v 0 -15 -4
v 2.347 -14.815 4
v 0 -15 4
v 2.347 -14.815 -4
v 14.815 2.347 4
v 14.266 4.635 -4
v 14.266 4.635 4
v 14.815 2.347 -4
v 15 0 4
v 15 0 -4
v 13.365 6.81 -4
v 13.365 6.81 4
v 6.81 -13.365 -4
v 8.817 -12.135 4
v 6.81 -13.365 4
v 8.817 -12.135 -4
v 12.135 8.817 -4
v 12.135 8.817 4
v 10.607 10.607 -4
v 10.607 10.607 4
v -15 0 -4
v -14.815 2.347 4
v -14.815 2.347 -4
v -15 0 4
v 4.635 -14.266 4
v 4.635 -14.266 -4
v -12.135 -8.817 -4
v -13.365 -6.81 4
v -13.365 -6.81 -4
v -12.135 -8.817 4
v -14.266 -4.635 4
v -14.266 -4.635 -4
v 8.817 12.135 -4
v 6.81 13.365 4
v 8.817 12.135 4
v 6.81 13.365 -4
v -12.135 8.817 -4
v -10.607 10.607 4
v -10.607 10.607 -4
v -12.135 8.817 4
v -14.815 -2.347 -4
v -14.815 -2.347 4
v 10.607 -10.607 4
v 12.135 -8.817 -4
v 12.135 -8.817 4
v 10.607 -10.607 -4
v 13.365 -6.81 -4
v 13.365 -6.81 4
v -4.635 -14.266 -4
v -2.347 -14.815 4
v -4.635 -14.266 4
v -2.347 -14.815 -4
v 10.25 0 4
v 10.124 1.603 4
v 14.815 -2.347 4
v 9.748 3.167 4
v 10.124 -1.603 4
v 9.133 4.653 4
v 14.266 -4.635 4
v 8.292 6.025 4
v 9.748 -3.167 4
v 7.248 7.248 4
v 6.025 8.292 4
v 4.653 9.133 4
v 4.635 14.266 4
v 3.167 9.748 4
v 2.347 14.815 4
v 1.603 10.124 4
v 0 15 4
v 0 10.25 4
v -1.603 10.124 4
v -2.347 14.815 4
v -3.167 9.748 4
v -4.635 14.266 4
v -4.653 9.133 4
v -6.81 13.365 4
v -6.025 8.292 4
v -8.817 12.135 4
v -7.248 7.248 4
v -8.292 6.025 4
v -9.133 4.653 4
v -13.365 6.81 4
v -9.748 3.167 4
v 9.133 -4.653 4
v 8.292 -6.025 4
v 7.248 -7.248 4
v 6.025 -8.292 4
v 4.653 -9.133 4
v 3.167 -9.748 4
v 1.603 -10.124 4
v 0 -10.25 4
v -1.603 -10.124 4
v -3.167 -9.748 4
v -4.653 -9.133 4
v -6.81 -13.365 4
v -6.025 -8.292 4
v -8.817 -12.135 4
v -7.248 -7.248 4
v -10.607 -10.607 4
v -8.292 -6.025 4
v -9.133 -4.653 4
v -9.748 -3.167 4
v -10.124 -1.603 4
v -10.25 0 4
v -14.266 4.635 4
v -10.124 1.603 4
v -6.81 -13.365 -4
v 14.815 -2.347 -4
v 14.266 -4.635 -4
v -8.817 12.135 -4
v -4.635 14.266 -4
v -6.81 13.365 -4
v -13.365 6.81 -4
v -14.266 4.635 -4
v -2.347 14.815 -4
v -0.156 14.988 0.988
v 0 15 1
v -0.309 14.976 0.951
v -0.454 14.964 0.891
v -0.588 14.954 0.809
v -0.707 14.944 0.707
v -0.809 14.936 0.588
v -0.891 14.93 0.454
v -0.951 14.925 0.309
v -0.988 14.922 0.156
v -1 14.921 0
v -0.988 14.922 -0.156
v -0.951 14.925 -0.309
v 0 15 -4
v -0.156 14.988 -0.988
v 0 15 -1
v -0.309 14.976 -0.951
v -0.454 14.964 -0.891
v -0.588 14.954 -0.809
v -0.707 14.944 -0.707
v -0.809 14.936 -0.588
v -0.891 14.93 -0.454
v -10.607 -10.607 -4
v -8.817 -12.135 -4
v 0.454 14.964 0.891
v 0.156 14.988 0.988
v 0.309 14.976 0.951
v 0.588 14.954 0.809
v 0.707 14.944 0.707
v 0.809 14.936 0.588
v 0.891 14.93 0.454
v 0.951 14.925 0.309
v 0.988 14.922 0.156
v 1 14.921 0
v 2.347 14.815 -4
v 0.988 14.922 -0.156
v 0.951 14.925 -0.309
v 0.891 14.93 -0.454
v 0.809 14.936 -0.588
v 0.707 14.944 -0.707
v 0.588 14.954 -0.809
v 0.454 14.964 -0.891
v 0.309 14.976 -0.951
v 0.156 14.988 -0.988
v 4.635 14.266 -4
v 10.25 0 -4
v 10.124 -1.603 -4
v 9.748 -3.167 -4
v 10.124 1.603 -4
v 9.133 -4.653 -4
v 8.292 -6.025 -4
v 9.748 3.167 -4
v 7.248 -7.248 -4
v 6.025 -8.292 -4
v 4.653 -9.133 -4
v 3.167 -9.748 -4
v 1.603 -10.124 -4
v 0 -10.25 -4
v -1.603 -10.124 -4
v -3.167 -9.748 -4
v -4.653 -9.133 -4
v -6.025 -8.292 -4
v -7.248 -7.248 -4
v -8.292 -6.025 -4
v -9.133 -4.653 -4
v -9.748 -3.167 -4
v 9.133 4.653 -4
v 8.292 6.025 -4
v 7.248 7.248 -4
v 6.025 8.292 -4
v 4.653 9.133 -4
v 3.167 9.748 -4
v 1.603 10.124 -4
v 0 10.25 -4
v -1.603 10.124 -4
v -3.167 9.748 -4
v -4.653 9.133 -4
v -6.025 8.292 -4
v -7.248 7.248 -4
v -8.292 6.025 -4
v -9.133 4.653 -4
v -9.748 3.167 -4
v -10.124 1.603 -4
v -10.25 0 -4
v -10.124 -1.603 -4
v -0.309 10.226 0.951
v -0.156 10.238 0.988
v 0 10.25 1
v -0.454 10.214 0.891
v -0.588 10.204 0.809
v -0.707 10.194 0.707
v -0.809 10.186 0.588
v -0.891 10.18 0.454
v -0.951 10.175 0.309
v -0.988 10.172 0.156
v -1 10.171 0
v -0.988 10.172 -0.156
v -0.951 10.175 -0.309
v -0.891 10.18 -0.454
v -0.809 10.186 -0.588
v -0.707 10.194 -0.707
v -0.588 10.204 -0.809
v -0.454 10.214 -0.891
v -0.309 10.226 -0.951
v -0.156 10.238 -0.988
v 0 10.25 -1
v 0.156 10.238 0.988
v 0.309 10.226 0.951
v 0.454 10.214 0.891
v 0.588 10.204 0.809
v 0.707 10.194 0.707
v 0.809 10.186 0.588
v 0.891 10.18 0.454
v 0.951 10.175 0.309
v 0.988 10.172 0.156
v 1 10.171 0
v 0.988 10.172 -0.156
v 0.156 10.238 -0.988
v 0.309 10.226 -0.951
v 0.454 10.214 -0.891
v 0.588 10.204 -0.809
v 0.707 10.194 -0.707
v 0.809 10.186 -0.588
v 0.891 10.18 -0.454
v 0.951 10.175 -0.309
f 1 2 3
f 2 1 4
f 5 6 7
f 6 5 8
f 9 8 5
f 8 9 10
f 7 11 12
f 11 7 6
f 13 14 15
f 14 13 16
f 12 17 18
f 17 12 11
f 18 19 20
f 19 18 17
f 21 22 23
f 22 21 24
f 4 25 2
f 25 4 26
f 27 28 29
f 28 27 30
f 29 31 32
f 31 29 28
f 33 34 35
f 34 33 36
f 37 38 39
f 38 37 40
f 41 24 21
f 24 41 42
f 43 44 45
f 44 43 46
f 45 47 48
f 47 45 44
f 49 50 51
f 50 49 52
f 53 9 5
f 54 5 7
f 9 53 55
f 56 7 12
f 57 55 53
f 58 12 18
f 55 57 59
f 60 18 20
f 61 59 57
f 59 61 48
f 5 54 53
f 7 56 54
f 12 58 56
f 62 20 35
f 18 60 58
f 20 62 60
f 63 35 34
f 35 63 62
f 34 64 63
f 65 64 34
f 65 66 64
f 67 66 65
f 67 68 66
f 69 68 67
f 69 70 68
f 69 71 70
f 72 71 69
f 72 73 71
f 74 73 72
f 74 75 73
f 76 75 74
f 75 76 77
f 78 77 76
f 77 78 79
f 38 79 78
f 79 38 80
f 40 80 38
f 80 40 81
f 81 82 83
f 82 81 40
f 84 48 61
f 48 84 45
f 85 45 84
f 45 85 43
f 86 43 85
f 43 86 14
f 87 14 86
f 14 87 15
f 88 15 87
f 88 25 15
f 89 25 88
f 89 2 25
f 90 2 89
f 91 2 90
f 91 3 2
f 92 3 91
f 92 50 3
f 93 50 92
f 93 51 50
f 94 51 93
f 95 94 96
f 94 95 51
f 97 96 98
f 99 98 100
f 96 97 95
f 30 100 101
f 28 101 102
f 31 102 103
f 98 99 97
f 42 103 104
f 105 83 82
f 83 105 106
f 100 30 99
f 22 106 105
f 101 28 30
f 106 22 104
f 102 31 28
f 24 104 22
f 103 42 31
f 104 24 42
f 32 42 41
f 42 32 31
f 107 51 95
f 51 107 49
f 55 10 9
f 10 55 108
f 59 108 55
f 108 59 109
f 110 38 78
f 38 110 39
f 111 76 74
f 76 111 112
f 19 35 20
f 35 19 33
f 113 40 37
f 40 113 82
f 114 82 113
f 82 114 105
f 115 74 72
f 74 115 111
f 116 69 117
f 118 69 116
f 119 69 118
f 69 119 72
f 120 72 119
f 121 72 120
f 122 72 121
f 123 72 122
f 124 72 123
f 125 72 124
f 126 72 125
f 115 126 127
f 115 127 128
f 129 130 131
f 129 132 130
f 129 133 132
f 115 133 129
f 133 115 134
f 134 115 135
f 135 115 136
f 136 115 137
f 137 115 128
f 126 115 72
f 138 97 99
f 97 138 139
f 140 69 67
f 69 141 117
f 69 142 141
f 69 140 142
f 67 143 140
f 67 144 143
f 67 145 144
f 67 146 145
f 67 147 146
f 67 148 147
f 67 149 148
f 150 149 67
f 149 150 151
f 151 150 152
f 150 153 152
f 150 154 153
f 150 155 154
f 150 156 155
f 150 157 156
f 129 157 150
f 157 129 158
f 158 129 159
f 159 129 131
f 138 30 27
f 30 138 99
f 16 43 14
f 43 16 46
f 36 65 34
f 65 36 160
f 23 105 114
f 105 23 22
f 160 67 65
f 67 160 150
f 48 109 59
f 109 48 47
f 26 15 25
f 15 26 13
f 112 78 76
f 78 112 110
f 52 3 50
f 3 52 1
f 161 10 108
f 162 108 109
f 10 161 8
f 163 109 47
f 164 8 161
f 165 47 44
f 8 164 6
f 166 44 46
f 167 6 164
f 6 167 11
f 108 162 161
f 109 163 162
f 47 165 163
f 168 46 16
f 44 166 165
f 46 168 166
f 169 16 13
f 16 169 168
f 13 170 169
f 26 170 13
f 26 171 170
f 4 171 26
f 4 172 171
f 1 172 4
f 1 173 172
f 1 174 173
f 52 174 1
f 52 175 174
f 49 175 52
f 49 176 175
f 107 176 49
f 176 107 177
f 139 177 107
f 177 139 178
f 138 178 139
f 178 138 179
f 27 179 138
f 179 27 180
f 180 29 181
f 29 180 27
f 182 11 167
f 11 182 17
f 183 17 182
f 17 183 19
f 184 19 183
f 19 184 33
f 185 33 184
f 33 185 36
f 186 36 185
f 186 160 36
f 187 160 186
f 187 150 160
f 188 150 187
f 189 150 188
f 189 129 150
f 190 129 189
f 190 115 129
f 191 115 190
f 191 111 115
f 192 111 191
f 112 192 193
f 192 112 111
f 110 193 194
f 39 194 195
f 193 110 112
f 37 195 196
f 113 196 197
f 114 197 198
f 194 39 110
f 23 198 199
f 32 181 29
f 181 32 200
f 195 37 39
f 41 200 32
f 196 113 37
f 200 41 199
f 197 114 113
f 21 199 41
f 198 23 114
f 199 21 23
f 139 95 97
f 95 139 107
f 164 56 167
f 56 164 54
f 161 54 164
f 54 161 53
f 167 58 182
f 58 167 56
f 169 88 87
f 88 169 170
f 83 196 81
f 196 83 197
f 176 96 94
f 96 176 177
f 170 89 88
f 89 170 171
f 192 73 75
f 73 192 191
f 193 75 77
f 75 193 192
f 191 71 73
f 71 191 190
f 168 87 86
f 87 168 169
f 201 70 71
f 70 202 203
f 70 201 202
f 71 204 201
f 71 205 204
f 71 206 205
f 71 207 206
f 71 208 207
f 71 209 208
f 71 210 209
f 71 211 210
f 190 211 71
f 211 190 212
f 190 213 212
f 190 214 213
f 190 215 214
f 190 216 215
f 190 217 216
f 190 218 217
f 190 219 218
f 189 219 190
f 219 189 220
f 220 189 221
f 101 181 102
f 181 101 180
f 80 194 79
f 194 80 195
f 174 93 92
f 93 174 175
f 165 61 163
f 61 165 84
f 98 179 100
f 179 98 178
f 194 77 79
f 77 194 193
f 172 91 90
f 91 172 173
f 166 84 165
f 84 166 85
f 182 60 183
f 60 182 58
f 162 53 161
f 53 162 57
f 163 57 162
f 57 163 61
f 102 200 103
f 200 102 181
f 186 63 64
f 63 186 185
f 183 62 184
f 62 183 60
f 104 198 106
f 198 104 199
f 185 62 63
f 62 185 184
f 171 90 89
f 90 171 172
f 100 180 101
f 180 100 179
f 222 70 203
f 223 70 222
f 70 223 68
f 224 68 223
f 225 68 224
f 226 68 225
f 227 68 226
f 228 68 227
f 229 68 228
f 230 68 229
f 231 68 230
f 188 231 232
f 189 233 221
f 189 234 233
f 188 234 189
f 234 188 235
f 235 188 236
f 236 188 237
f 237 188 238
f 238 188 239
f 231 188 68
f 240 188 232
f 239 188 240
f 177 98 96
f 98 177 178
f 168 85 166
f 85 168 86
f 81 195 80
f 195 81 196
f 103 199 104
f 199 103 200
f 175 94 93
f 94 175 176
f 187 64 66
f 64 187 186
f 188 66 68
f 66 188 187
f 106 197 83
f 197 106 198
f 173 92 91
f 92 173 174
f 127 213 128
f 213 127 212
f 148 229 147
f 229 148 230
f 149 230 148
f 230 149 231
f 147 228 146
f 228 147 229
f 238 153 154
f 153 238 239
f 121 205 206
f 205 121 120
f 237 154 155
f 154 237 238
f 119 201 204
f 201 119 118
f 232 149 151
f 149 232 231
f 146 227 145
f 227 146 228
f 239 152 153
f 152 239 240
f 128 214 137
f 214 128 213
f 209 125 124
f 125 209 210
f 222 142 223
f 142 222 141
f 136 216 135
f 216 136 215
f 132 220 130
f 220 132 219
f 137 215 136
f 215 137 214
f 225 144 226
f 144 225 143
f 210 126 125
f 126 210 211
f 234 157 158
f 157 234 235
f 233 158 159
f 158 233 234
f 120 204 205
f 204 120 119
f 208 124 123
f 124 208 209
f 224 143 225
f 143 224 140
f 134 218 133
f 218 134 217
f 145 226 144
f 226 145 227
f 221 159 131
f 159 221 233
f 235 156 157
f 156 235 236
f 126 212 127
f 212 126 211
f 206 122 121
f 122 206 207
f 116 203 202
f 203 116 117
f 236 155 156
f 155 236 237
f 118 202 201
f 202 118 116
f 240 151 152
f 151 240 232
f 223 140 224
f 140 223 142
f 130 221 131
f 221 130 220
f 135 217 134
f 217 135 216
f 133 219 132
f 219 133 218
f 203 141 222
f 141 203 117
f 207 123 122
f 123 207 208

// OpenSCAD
//Author: Piotr Paterek, Kraków 05-08.2016
$fn=40;
difference()
{
    difference()
    {
        cylinder(r=15,h=8, center=true);
        cylinder(r=10.25,h=8, center=true);
    }
    translate([0,14,0])
    {
        rotate(a=90,v=[1,0,0])
        {
            cylinder(r=1,h=8,center=true);
        }
    }
}
